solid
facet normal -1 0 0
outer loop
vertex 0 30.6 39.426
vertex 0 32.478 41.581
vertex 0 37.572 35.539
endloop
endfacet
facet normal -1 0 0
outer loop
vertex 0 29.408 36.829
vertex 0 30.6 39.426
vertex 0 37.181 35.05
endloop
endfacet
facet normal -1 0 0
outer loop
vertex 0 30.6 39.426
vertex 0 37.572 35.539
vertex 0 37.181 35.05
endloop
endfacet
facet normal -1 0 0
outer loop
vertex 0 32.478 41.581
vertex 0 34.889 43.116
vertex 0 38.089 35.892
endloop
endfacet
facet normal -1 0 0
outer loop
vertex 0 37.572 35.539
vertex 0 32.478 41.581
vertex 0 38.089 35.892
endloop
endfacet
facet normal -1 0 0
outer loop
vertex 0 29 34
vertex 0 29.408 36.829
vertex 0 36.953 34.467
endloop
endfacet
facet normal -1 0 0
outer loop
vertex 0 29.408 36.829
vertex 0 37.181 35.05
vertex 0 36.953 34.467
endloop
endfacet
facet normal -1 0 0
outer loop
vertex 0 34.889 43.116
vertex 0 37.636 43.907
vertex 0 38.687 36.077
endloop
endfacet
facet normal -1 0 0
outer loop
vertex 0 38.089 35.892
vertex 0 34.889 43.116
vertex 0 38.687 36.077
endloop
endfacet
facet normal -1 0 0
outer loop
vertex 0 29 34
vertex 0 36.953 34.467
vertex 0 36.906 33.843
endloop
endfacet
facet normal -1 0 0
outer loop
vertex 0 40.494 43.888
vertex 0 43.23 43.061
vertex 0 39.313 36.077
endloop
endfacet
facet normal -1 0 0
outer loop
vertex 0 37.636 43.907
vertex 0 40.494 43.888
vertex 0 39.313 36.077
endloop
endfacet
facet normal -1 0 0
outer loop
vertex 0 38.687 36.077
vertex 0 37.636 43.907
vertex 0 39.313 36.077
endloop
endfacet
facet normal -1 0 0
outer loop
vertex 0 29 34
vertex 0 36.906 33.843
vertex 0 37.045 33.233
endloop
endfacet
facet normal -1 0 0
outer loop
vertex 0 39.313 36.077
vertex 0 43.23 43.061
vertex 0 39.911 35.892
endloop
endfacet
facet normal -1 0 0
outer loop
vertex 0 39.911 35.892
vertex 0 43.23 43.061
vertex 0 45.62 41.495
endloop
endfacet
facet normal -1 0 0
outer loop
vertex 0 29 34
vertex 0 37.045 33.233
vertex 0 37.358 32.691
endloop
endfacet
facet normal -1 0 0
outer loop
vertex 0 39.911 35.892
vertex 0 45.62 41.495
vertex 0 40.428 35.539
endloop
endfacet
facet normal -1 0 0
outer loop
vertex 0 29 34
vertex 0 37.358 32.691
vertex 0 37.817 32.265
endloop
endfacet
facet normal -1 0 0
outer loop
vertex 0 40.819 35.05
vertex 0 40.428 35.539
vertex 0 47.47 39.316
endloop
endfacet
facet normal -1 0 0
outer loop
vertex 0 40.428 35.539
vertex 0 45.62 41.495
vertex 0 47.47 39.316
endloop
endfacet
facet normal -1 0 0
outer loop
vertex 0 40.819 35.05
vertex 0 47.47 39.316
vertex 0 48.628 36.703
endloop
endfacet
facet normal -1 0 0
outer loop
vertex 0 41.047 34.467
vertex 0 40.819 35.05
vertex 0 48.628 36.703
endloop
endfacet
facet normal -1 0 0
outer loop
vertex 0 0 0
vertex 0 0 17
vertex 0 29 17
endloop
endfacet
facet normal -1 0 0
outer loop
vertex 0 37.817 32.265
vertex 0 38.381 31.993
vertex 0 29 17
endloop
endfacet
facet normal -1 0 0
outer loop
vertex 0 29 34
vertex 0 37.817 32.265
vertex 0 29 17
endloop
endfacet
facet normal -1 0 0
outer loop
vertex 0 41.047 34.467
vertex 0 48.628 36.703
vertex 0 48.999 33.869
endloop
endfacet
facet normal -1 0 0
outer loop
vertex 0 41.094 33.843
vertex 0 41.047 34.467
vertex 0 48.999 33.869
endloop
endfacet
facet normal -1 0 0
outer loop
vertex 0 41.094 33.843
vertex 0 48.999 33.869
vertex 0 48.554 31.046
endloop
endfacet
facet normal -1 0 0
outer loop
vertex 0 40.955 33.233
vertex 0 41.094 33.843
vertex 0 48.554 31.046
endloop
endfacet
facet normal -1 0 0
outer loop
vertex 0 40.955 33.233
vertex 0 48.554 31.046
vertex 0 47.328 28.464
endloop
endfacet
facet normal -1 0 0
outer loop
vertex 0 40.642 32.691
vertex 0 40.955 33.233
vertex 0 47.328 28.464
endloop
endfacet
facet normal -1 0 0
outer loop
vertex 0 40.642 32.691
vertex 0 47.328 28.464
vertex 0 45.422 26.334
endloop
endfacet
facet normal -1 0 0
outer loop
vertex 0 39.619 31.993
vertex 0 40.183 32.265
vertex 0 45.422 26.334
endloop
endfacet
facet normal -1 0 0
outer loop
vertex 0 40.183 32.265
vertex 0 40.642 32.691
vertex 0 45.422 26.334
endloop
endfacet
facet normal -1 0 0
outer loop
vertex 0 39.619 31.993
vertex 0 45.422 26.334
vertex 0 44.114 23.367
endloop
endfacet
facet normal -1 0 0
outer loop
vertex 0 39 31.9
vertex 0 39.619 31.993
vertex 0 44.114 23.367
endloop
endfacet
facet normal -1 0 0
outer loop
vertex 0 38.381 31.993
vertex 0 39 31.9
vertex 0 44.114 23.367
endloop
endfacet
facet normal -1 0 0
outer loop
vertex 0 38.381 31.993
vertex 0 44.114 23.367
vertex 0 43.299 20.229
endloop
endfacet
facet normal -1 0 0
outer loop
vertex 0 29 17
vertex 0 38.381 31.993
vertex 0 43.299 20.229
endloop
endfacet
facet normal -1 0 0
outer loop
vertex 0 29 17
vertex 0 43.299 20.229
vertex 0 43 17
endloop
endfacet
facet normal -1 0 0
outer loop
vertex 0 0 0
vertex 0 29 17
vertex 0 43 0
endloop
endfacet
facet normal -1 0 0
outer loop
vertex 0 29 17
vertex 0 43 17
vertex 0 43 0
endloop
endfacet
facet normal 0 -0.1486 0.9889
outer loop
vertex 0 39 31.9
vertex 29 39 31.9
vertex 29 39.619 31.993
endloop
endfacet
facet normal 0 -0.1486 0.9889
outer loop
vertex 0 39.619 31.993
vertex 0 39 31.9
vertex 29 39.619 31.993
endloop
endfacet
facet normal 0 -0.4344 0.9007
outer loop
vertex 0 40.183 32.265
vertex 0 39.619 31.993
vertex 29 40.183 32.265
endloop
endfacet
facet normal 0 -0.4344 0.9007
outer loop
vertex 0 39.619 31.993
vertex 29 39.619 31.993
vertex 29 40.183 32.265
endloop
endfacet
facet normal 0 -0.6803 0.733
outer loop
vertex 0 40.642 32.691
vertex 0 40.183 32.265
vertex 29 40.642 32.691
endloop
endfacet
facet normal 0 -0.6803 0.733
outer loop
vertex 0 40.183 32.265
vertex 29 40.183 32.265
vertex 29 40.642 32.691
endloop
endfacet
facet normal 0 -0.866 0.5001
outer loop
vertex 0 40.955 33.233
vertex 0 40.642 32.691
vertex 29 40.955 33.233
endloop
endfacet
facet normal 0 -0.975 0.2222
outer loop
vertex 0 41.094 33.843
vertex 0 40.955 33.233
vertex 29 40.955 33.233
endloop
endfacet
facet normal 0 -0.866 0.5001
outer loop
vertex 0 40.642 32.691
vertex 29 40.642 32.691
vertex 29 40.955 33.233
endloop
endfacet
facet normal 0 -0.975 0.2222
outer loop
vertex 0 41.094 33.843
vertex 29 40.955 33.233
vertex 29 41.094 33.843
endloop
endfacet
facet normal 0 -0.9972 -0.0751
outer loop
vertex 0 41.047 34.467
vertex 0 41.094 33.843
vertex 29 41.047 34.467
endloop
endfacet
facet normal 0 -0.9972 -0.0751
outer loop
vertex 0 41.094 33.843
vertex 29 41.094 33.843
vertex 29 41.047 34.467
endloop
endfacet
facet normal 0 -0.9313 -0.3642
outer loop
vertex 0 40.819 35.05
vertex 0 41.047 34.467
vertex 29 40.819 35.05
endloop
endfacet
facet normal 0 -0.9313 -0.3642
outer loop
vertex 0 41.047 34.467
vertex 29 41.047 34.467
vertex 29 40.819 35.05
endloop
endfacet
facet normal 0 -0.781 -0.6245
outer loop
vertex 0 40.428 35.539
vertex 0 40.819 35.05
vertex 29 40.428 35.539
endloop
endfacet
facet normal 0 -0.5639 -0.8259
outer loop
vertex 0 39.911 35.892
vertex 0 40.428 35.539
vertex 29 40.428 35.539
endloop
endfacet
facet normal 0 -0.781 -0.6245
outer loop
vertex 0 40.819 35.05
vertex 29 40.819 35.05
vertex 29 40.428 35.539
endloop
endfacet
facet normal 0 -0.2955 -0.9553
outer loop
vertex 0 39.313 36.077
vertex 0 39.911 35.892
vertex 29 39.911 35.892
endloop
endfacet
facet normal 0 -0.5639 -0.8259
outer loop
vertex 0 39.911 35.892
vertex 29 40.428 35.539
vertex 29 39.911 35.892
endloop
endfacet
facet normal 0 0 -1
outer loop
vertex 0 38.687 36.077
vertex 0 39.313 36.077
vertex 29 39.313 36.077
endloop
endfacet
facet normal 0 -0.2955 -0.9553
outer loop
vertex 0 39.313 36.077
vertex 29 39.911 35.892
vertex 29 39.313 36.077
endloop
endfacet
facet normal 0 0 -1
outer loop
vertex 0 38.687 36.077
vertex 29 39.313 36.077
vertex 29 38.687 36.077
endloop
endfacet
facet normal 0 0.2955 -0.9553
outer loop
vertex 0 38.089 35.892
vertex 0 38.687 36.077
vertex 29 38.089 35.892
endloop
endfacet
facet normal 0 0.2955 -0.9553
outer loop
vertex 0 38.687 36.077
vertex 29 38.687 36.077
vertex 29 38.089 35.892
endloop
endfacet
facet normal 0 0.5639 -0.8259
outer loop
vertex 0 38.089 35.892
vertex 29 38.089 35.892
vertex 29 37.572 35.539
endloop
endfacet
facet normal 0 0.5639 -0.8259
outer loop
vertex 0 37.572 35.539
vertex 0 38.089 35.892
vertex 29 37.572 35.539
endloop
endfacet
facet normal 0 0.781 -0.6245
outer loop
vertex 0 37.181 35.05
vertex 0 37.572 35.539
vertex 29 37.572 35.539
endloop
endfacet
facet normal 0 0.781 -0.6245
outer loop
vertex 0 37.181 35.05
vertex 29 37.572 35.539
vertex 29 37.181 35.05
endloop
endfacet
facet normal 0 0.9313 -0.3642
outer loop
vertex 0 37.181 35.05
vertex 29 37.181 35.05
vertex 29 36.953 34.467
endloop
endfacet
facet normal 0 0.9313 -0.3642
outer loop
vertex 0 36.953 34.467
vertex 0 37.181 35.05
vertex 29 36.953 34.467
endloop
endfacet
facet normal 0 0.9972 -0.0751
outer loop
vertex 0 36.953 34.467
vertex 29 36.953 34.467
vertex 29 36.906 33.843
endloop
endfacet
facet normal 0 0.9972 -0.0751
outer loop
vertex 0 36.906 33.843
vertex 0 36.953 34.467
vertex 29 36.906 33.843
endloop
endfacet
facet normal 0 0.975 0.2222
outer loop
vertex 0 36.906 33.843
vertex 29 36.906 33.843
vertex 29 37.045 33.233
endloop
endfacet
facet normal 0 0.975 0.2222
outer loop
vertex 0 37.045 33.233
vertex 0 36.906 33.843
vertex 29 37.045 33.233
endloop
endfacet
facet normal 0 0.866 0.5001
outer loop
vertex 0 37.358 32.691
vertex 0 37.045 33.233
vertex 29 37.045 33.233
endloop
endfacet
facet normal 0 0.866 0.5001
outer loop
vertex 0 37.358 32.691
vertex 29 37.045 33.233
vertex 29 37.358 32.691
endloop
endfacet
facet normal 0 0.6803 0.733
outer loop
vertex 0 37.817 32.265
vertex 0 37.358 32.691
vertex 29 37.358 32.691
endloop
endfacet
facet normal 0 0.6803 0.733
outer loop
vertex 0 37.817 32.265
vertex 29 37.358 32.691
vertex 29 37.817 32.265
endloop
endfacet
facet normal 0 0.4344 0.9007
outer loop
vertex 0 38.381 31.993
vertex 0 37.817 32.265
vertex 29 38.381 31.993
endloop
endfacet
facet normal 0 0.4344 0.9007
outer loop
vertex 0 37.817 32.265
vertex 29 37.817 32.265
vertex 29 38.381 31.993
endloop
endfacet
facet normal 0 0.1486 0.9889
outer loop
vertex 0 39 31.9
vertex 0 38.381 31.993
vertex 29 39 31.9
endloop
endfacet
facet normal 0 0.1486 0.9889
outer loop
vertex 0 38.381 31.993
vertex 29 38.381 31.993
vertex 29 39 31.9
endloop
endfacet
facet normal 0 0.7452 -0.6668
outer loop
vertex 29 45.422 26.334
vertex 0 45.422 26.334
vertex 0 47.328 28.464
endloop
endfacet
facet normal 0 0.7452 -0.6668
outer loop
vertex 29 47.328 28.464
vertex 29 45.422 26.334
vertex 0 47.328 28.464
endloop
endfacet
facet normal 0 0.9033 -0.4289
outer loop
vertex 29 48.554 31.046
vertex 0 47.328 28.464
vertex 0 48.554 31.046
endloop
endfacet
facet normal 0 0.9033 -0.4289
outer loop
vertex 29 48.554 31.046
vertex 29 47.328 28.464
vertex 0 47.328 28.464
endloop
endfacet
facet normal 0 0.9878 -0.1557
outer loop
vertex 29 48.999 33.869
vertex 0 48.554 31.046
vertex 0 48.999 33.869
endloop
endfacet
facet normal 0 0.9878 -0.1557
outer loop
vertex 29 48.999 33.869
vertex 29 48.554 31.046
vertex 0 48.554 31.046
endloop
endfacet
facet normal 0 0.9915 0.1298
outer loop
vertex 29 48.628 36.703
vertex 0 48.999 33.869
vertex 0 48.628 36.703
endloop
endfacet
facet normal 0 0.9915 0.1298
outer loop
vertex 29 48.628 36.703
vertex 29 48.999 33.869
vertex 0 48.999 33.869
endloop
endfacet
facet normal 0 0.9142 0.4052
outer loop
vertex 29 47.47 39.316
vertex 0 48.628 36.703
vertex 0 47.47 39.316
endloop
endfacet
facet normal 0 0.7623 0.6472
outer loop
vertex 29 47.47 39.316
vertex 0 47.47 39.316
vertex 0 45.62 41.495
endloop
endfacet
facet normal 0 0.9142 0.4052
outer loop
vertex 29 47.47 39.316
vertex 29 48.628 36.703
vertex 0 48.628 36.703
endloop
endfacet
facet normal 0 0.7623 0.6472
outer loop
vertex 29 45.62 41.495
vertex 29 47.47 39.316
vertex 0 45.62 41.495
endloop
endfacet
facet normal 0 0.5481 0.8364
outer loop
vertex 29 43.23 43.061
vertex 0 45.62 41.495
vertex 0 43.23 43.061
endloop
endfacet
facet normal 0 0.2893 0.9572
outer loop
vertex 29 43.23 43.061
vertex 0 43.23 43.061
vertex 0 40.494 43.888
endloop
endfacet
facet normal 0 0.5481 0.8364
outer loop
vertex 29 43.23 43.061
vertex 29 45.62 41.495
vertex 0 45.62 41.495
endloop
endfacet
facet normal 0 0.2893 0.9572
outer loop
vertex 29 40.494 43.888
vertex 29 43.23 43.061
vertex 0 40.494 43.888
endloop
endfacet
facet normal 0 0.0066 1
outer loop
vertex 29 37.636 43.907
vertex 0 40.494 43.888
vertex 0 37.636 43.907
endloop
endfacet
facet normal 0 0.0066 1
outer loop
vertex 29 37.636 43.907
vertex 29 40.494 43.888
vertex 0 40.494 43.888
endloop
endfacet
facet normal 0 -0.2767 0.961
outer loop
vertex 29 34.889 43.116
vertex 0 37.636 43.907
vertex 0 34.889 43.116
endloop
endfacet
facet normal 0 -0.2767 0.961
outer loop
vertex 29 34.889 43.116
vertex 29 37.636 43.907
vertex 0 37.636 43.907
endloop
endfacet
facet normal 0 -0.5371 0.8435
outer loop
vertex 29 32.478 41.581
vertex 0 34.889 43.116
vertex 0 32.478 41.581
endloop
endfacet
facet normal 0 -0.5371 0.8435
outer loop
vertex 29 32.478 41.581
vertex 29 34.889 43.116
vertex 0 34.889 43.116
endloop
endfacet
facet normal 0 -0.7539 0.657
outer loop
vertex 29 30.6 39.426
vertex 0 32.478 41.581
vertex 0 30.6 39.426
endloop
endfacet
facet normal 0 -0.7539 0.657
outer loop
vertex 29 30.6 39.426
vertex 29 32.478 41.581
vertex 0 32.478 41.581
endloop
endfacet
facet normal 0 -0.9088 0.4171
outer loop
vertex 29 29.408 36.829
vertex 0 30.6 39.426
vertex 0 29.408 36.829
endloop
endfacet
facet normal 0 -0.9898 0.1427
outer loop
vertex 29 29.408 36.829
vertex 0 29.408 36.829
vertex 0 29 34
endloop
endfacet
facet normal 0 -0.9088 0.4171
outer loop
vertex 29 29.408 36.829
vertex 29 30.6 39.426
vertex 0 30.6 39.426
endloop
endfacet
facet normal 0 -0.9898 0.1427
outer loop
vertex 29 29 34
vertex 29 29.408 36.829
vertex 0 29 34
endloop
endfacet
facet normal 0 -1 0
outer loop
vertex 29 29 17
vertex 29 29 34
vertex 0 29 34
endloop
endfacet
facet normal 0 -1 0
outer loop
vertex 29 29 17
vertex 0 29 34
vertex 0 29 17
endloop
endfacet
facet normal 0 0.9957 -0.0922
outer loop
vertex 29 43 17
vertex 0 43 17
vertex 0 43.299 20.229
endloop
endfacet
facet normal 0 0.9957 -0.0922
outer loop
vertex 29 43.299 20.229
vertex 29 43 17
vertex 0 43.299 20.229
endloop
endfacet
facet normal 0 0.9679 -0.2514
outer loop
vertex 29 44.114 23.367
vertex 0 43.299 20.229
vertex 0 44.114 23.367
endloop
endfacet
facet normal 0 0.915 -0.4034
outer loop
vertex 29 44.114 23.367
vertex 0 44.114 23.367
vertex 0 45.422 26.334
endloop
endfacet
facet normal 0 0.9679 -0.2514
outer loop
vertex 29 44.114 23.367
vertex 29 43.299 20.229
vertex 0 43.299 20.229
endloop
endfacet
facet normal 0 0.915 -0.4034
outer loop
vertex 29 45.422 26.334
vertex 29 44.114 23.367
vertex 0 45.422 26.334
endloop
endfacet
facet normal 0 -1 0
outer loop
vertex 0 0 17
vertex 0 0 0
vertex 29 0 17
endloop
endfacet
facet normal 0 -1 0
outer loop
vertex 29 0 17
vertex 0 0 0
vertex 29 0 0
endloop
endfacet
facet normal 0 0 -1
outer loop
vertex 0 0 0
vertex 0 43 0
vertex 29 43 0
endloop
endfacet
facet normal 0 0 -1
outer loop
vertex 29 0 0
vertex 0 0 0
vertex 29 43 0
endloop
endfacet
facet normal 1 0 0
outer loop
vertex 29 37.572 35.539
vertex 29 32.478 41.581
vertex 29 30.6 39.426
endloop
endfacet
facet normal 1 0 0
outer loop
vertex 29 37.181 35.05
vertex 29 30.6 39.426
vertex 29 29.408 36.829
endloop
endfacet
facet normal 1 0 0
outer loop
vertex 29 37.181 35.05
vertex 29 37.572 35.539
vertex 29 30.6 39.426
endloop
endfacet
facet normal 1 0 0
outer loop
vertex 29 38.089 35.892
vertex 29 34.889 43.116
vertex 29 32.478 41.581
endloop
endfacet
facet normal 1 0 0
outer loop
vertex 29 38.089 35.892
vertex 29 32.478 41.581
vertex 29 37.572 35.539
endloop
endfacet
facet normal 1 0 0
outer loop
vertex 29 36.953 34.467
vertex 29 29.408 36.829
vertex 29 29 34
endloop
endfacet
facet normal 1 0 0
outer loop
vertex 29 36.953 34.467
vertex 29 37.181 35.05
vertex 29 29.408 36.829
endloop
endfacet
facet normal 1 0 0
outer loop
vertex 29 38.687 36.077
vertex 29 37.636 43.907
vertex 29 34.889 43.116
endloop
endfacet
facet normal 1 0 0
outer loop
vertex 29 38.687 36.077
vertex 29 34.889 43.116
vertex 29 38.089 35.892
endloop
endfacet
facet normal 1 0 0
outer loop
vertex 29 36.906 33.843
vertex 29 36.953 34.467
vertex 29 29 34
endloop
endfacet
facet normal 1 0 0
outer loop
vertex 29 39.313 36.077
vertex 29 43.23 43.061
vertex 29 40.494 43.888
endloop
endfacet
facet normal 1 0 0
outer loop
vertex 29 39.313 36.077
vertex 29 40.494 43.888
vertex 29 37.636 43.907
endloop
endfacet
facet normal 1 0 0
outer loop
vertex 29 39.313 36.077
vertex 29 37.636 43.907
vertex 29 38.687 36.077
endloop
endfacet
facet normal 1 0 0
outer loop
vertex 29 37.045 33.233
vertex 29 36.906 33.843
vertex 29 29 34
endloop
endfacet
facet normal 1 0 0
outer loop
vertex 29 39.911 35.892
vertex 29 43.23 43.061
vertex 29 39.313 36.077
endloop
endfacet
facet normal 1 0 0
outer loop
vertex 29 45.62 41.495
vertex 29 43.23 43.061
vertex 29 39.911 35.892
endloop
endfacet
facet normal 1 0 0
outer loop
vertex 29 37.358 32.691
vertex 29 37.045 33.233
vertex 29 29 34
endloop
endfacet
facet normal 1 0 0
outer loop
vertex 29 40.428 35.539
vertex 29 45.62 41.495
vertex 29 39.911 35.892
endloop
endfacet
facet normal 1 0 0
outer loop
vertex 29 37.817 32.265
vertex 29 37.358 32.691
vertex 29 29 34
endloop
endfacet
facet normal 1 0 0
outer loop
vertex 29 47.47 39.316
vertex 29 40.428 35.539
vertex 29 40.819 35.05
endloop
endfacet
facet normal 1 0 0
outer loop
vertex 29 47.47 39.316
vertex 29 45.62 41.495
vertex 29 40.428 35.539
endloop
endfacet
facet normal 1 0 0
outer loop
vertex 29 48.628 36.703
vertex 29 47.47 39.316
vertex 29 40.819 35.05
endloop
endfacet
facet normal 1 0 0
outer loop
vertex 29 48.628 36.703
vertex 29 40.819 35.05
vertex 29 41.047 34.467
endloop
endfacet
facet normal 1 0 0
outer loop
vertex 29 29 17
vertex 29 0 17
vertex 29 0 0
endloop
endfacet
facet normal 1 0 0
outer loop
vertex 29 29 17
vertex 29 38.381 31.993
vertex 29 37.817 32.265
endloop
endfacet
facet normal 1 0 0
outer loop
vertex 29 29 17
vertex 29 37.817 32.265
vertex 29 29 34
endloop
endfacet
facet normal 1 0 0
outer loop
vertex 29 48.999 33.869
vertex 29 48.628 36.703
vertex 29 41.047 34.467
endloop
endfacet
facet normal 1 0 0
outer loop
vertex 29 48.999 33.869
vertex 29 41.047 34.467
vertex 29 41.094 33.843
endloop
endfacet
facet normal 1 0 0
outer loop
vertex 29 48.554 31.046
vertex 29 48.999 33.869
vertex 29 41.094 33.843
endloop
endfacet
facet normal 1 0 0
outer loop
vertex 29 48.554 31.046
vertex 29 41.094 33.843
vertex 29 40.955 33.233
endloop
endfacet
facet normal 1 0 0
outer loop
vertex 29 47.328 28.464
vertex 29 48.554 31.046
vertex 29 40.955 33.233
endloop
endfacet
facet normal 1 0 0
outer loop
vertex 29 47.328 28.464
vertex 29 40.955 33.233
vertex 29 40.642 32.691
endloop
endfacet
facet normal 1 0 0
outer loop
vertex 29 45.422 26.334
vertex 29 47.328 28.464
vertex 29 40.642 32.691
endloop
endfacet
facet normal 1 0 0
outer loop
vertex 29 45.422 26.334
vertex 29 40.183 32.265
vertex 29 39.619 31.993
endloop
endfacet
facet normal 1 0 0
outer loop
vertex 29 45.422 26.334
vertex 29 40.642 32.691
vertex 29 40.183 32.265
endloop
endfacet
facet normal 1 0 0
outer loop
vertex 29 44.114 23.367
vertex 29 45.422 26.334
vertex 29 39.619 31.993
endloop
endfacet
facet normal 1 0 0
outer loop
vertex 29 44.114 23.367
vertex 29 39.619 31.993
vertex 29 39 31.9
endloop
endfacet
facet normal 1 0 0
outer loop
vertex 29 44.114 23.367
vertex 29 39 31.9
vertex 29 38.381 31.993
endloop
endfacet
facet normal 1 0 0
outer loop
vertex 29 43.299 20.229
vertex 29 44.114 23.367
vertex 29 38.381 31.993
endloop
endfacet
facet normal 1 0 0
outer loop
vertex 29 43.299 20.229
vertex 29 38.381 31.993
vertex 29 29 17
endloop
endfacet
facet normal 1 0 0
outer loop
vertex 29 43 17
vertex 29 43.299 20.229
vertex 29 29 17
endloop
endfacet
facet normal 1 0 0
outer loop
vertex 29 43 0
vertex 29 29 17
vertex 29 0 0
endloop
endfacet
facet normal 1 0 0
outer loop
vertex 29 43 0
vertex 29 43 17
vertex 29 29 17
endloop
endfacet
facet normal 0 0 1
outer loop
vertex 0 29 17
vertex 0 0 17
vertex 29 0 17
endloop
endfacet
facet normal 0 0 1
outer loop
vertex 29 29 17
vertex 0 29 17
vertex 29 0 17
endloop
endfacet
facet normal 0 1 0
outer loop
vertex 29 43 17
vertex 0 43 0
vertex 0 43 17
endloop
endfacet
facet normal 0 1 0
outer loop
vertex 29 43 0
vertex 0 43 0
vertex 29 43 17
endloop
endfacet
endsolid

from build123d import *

# Parameters (mm, degrees)
CROQUIS1_W              = 29
CROQUIS1_H              = 17
SALIENTE_EXTRUIR1_DEPTH = 43
CROQUIS2_R              = 10
SALIENTE_EXTRUIR2_DEPTH = 29
CROQUIS3_R              = 2.1
CORTAR_EXTRUIR1_DEPTH   = 29
SALIENTE_EXTRUIR3_DEPTH = 29


with BuildPart() as part:
    # Croquis1 → Saliente-Extruir1 (new body)
    with BuildSketch(Plane(origin=(0, 0, 0), x_dir=(1, 0, 0), z_dir=(0, 1, 0))):
        with Locations((14.5, -8.5)):
            Rectangle(CROQUIS1_W, CROQUIS1_H)
    extrude(amount=SALIENTE_EXTRUIR1_DEPTH)



with BuildPart() as body_2:
    # Croquis2 → Saliente-Extruir2 (new body)
    with BuildSketch(Plane(origin=(29, 0, 0), x_dir=(0, 0, -1), z_dir=(1, 0, 0))):
        with Locations((-34, 39)):
            Circle(CROQUIS2_R)
    extrude(amount=-SALIENTE_EXTRUIR2_DEPTH)

    # Croquis3 → Cortar-Extruir1 (cut)
    with BuildSketch(Plane(origin=(29, 0, 0), x_dir=(0, 0, -1), z_dir=(1, 0, 0))):
        with Locations((-34, 39)):
            Circle(CROQUIS3_R)
    extrude(amount=-CORTAR_EXTRUIR1_DEPTH, mode=Mode.SUBTRACT)


with BuildPart() as part_1:
    add(part.part)

    add(body_2.part)  # Saliente-Extruir3 merges body 2
    # Croquis4 → Saliente-Extruir3 (add)
    with BuildSketch(Plane(origin=(29, 0, 0), x_dir=(0, 0, -1), z_dir=(1, 0, 0))):
        with BuildLine():
            Line((-34, 29), (-17, 29))
            Line((-17, 29), (-17, 43))
            ThreePointArc((-17, 43), (-21.814511478, 43.643262372), (-26.334473676, 45.421814866))
            ThreePointArc((-26.334473676, 45.421814866), (-24.938594241, 34.770233379), (-34, 29))
        make_face()
    extrude(amount=-SALIENTE_EXTRUIR3_DEPTH)


solid = part_1.part
